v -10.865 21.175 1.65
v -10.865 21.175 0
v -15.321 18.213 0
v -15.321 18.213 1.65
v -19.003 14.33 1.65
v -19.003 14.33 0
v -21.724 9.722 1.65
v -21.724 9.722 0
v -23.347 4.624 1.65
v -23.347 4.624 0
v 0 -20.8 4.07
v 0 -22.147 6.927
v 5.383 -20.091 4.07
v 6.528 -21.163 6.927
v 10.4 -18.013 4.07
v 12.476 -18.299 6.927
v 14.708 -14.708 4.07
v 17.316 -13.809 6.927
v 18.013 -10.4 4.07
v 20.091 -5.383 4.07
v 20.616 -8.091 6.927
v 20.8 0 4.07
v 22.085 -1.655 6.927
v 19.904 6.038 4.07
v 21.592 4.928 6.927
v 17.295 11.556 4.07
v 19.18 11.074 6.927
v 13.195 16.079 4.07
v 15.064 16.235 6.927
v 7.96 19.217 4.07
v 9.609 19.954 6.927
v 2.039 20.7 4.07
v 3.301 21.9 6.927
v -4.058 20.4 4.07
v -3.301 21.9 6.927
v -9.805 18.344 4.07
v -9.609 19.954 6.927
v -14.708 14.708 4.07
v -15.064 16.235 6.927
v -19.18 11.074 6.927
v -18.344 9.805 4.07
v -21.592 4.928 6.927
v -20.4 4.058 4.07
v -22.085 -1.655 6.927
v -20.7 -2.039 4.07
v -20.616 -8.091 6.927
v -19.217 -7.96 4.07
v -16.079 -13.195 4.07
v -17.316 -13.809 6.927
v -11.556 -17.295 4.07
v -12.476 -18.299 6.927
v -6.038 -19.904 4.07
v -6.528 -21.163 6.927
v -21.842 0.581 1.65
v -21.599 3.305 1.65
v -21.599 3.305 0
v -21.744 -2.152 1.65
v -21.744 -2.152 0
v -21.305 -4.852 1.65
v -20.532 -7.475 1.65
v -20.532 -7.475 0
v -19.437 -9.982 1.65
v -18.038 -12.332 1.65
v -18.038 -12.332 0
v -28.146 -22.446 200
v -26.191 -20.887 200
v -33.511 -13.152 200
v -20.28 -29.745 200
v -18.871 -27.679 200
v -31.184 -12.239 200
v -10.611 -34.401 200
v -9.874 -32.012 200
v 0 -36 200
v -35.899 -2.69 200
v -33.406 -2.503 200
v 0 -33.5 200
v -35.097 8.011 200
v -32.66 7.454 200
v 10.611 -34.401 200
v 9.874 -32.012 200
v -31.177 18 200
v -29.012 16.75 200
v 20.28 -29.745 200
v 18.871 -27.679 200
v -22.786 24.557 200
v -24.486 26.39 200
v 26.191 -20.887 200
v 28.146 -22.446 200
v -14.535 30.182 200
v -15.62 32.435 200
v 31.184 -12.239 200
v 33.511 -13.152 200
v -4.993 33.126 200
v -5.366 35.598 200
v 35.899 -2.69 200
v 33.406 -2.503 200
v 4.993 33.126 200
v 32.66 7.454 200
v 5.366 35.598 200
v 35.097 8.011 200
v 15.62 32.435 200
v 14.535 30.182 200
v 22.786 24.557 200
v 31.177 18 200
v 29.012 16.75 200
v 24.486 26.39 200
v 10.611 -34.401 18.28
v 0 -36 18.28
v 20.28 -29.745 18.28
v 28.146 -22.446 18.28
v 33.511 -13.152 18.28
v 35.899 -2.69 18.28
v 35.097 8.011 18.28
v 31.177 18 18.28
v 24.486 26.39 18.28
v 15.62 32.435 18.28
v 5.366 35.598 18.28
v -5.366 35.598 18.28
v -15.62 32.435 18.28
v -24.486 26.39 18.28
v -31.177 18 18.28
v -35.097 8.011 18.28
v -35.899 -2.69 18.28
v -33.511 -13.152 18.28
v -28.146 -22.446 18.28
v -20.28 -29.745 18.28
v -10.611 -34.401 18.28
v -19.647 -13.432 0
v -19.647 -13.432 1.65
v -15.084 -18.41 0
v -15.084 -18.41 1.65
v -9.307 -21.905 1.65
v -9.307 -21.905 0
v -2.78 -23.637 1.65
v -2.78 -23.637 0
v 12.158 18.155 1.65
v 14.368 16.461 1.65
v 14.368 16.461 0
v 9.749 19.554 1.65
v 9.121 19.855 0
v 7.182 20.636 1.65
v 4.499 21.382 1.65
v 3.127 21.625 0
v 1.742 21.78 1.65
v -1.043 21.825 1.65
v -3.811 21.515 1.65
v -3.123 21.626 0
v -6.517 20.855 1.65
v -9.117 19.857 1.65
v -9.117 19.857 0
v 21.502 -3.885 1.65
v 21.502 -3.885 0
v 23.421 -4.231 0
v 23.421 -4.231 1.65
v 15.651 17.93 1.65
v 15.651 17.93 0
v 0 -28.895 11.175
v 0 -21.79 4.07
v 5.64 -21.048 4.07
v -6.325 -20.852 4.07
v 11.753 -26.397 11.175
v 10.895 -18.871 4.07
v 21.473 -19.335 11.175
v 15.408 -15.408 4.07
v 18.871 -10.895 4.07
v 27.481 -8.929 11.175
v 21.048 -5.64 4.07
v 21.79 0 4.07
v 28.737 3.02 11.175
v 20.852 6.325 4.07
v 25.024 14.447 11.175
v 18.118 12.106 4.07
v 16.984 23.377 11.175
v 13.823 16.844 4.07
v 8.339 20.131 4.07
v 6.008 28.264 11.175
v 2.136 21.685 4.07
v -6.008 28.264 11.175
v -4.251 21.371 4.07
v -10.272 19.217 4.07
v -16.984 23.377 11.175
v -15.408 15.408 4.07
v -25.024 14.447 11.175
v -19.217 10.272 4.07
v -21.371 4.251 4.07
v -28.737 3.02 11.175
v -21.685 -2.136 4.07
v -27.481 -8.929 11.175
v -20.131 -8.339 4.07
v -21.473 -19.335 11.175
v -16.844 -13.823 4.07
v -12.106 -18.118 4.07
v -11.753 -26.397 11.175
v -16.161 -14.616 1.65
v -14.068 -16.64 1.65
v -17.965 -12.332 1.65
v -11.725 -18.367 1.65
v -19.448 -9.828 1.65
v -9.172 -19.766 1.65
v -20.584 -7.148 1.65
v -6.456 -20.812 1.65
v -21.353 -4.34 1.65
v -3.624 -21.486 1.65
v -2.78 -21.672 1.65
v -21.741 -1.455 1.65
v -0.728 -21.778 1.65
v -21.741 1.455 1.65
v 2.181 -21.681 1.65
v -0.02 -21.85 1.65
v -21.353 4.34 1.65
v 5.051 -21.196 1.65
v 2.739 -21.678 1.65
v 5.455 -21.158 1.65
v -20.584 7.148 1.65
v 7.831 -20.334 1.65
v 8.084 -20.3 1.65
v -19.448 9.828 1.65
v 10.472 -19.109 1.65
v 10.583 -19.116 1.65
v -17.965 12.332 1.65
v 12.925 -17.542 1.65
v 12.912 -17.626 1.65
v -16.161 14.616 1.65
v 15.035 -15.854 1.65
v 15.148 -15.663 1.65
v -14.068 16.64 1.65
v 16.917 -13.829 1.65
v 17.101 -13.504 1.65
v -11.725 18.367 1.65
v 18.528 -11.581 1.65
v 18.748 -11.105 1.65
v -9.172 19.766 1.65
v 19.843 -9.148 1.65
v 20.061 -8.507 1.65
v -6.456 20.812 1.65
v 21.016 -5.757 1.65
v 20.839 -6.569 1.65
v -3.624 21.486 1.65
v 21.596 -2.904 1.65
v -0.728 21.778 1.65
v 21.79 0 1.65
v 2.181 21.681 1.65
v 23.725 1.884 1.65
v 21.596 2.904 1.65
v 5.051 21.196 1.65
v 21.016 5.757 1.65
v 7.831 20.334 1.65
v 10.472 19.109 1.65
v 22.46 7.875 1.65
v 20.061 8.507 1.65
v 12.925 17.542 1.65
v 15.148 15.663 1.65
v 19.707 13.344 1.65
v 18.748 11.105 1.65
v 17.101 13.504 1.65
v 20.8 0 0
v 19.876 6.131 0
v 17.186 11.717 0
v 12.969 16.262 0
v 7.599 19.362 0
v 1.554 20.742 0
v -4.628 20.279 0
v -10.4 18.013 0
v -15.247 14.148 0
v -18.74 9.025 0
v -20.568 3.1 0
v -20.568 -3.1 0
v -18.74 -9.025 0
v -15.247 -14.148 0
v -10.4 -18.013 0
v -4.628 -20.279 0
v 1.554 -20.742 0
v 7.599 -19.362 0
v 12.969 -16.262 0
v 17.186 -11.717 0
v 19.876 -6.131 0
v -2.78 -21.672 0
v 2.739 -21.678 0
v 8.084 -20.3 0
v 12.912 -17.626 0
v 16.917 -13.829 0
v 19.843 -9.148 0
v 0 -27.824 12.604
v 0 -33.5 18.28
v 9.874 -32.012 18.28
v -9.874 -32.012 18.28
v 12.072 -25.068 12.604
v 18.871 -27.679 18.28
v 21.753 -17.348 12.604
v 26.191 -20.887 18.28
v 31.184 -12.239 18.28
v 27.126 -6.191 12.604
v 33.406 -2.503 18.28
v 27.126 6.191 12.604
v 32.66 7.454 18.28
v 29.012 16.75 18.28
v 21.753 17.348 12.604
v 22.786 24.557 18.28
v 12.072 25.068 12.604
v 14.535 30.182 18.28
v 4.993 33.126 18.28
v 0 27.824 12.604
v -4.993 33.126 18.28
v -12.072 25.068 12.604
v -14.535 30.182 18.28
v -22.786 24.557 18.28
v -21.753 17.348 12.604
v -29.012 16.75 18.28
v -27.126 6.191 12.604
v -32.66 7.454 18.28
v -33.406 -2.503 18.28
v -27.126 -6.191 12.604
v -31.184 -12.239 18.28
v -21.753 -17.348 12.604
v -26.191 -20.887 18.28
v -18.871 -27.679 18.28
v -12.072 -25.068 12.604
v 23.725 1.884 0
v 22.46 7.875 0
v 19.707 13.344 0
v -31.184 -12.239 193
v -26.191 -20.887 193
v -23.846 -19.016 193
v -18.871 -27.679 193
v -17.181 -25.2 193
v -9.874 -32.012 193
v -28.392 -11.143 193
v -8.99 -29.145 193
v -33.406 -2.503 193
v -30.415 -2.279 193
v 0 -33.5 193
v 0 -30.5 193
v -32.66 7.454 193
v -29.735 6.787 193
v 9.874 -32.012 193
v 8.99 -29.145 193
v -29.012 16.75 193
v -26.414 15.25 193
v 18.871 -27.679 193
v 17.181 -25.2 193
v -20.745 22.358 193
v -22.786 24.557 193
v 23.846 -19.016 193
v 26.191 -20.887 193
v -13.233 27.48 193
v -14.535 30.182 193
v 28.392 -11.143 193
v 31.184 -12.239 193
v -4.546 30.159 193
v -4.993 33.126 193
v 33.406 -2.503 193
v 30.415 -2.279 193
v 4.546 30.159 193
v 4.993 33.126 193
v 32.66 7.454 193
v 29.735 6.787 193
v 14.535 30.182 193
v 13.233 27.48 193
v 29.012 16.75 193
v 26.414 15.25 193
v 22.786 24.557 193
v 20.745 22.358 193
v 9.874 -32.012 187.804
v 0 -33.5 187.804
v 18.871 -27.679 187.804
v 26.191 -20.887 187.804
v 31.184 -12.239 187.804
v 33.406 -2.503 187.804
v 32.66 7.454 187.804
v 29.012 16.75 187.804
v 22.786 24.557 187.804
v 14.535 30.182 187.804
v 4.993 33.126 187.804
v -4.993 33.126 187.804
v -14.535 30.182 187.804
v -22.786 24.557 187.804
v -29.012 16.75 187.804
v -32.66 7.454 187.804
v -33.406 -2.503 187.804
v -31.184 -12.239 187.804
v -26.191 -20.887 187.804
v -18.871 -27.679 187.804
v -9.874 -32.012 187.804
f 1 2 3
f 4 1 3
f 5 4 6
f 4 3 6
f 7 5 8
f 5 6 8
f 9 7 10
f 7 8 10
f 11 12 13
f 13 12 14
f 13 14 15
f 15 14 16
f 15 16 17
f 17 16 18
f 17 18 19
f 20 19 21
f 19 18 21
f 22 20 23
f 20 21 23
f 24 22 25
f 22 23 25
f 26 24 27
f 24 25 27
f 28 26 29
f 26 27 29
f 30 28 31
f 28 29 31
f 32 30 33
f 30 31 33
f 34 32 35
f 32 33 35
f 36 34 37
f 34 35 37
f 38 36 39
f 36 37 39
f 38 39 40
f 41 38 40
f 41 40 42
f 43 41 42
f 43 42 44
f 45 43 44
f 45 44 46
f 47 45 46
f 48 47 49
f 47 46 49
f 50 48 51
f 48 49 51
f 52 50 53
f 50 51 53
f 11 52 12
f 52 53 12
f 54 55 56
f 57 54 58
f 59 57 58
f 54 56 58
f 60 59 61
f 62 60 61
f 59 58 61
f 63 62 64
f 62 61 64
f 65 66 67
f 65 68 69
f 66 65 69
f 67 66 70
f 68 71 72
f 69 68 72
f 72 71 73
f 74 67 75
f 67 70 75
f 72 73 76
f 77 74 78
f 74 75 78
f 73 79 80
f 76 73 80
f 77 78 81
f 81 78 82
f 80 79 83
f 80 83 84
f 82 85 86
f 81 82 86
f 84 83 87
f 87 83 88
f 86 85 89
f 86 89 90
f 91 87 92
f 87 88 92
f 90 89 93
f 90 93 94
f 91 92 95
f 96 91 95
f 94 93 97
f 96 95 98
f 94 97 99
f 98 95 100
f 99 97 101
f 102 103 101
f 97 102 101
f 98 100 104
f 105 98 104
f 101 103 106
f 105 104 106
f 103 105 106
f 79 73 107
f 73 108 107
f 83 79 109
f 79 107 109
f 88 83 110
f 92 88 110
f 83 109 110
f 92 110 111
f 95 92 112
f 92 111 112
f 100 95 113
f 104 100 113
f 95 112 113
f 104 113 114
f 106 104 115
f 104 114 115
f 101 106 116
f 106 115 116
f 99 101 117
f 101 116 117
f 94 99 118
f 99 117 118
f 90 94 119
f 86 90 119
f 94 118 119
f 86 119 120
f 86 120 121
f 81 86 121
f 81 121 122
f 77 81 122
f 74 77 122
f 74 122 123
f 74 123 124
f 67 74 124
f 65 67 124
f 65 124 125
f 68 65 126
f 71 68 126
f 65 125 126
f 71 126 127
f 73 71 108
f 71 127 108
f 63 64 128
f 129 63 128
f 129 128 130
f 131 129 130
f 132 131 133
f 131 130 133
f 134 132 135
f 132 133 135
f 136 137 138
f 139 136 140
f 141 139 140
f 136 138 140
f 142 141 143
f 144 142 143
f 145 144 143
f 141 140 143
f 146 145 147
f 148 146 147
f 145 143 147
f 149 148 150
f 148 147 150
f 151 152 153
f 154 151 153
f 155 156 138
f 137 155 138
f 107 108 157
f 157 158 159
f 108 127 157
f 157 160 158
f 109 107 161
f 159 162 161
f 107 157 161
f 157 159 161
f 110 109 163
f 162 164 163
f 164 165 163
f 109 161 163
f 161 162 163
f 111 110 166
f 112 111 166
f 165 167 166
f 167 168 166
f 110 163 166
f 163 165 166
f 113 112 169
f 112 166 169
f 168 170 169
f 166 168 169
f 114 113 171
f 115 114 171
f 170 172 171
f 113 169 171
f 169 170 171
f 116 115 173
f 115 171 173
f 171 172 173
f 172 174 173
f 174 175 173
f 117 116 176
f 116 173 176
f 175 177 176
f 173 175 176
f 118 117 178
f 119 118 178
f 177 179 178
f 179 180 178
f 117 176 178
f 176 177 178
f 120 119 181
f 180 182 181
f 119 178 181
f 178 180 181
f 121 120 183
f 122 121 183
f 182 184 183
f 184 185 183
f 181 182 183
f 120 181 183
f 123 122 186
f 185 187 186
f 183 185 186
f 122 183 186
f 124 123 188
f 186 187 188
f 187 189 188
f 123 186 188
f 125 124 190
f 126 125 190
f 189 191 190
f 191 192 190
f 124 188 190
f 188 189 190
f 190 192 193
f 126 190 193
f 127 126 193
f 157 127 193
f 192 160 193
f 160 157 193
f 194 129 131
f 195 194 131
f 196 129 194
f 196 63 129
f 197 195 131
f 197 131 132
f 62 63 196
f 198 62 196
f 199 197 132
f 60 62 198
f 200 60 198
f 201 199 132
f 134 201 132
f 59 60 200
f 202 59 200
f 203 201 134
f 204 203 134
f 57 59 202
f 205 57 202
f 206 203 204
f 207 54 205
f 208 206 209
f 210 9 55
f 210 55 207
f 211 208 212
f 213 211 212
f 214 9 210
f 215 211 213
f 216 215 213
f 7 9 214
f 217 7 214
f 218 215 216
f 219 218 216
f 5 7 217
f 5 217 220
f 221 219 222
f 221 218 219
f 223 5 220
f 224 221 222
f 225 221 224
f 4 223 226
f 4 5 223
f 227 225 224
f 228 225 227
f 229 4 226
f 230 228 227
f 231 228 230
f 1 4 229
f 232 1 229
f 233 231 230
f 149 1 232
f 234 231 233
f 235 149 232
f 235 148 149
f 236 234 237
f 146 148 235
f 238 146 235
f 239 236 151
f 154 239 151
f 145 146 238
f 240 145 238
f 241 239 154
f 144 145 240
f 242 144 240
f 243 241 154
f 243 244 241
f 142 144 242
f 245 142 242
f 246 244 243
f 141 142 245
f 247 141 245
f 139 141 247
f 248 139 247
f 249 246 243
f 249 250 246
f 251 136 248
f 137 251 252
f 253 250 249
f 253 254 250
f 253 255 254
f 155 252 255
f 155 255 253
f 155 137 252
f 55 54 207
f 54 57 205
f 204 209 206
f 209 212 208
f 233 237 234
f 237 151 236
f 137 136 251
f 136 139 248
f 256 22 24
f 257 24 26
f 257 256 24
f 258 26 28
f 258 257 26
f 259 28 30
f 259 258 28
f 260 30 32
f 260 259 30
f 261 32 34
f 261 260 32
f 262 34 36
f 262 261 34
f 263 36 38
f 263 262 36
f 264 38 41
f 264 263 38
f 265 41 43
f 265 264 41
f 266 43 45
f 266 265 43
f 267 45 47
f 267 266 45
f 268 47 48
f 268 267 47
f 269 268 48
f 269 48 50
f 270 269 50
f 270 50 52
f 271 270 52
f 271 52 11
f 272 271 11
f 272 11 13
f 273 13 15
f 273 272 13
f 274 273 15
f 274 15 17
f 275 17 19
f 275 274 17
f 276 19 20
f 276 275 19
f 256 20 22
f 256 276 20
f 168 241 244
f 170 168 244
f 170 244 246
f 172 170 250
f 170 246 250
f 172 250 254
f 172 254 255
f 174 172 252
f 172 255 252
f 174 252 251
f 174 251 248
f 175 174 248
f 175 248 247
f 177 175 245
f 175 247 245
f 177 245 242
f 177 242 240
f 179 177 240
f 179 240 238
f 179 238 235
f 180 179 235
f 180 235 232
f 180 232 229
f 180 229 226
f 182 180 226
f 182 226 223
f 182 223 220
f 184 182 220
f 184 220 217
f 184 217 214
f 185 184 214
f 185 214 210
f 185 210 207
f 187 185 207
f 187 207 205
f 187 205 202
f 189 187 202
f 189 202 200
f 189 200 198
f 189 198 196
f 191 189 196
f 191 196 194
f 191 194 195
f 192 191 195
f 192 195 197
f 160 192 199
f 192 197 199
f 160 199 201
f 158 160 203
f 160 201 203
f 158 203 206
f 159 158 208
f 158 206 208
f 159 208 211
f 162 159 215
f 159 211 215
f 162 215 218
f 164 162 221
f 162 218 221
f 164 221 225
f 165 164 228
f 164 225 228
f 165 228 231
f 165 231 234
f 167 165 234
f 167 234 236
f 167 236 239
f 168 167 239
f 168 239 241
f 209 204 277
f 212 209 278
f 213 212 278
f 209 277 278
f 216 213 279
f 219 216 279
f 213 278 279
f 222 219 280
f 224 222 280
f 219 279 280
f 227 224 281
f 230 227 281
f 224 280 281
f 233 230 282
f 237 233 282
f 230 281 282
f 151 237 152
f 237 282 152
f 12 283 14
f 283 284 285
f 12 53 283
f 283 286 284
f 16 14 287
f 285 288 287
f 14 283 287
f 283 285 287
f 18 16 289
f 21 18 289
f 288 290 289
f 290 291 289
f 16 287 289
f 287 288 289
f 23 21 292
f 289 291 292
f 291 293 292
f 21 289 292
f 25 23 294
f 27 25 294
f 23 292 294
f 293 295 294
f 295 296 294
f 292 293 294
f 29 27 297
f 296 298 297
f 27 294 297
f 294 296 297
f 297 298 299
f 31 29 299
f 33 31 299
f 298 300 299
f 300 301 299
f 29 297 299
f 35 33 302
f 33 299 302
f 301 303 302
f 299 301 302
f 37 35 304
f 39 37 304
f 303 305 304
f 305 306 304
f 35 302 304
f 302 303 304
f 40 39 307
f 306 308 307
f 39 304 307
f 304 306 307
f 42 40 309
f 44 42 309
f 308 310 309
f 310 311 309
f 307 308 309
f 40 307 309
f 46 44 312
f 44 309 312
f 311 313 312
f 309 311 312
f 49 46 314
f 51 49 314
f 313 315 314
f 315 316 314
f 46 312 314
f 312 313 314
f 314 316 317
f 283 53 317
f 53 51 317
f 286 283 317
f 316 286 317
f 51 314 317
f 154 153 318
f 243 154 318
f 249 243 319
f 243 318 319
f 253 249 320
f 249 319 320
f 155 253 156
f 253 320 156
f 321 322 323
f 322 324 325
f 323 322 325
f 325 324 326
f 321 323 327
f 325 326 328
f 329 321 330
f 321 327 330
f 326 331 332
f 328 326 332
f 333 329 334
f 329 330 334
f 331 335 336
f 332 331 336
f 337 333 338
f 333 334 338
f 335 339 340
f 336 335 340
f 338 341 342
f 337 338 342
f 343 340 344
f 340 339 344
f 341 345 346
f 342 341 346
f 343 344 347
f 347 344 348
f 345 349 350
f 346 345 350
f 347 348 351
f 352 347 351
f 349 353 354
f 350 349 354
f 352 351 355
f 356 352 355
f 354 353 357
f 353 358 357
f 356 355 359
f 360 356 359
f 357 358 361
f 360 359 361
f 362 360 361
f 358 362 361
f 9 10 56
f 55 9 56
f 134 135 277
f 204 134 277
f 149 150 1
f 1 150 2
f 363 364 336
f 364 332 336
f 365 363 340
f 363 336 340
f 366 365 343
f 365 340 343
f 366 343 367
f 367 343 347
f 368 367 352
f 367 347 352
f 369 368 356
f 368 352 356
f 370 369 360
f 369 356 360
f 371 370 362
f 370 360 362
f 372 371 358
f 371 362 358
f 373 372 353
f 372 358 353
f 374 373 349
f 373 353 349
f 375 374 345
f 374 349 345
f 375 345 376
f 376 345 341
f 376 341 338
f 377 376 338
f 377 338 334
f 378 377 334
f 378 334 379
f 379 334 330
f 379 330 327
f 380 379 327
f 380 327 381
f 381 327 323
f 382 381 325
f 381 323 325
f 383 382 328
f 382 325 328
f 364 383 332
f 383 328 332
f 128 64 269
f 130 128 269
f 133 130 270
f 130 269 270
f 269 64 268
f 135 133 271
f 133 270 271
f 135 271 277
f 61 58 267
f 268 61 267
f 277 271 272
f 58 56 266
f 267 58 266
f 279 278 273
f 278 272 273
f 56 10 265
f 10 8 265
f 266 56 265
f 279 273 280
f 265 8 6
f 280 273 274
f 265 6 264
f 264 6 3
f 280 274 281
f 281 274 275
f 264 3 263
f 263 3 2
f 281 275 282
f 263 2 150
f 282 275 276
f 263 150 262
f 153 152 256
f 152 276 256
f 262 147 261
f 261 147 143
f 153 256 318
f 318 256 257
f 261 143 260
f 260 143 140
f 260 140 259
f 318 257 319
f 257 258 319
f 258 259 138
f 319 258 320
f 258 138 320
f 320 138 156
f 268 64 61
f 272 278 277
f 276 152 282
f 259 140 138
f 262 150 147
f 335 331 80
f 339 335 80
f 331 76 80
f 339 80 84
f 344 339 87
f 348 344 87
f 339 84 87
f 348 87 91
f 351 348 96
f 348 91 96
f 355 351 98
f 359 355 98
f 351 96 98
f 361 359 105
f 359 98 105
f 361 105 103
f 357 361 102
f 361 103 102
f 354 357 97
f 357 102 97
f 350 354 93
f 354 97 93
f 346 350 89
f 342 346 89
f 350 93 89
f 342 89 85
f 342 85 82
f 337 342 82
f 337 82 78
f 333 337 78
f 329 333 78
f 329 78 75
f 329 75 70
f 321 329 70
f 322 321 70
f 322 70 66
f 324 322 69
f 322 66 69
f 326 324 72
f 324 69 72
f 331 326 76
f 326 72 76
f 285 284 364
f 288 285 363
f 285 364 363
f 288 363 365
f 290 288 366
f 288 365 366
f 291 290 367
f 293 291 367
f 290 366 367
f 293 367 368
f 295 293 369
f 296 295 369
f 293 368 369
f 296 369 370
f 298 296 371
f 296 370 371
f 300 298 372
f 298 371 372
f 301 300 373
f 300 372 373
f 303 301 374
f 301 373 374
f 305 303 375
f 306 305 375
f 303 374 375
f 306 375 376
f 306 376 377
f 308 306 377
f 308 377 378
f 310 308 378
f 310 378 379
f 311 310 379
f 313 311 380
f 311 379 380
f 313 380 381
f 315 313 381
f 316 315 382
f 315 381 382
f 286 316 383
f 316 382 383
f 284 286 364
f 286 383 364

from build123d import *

# Parameters (mm, degrees)
F0_R     = 20.8
F1_DEPTH = 1.65
F2_R     = 21.79
F2_R_2   = 20.8
F3_DEPTH = 2.42


with BuildPart() as f1:
    # F0 (on Top) → F1 (new body)
    with BuildSketch(Plane.XY):
        with BuildLine():
            Line((-23.346566, 4.62362), (-21.59853, 3.30545))
            ThreePointArc((-21.59853, 3.30545), (-21.304567, -4.85159), (-18.037579, -12.331596))
            Line((-18.037579, -12.331596), (-19.64734, -13.432127))
            ThreePointArc((-19.64734, -13.432127), (-12.319875, -20.363219), (-2.779779, -23.637107))
            Line((-2.779779, -23.637107), (-2.779779, -21.672456))
            ThreePointArc((-2.779779, -21.672456), (12.912471, -17.626417), (21.501922, -3.884566))
            Line((21.501922, -3.884566), (23.420858, -4.231244))
            ThreePointArc((23.420858, -4.231244), (22.459544, 7.874571), (15.650801, 17.93021))
            Line((15.650801, 17.93021), (14.368487, 16.461138))
            ThreePointArc((14.368487, 16.461138), (3.12676, 21.625121), (-9.117285, 19.856928))
            Line((-9.117285, 19.856928), (-10.865321, 21.175098))
            ThreePointArc((-10.865321, 21.175098), (-19.002662, 14.329649), (-23.346566, 4.62362))
        make_face()
        Circle(F0_R, mode=Mode.SUBTRACT)
    extrude(amount=F1_DEPTH)

    # F2 (on face) → F3 (join)
    with BuildSketch(Plane.XY.offset(1.65)):
        Circle(F2_R)
        Circle(F2_R_2, mode=Mode.SUBTRACT)
    extrude(amount=F3_DEPTH)

    # F4 (on Right) → F5 (revolve)
    with BuildSketch(Plane.YZ):
        Polygon((-33.5, 193), (-33.5, 200), (-36, 200), (-36, 18.28), (-21.79, 4.07), (-20.8, 4.07), (-22.147417, 6.927417), (-33.5, 18.28), (-33.5, 187.803848), (-30.5, 193), align=None)
    revolve(axis=Axis((0, 0, 100), (0, 0, 1)))


solid = f1.part
